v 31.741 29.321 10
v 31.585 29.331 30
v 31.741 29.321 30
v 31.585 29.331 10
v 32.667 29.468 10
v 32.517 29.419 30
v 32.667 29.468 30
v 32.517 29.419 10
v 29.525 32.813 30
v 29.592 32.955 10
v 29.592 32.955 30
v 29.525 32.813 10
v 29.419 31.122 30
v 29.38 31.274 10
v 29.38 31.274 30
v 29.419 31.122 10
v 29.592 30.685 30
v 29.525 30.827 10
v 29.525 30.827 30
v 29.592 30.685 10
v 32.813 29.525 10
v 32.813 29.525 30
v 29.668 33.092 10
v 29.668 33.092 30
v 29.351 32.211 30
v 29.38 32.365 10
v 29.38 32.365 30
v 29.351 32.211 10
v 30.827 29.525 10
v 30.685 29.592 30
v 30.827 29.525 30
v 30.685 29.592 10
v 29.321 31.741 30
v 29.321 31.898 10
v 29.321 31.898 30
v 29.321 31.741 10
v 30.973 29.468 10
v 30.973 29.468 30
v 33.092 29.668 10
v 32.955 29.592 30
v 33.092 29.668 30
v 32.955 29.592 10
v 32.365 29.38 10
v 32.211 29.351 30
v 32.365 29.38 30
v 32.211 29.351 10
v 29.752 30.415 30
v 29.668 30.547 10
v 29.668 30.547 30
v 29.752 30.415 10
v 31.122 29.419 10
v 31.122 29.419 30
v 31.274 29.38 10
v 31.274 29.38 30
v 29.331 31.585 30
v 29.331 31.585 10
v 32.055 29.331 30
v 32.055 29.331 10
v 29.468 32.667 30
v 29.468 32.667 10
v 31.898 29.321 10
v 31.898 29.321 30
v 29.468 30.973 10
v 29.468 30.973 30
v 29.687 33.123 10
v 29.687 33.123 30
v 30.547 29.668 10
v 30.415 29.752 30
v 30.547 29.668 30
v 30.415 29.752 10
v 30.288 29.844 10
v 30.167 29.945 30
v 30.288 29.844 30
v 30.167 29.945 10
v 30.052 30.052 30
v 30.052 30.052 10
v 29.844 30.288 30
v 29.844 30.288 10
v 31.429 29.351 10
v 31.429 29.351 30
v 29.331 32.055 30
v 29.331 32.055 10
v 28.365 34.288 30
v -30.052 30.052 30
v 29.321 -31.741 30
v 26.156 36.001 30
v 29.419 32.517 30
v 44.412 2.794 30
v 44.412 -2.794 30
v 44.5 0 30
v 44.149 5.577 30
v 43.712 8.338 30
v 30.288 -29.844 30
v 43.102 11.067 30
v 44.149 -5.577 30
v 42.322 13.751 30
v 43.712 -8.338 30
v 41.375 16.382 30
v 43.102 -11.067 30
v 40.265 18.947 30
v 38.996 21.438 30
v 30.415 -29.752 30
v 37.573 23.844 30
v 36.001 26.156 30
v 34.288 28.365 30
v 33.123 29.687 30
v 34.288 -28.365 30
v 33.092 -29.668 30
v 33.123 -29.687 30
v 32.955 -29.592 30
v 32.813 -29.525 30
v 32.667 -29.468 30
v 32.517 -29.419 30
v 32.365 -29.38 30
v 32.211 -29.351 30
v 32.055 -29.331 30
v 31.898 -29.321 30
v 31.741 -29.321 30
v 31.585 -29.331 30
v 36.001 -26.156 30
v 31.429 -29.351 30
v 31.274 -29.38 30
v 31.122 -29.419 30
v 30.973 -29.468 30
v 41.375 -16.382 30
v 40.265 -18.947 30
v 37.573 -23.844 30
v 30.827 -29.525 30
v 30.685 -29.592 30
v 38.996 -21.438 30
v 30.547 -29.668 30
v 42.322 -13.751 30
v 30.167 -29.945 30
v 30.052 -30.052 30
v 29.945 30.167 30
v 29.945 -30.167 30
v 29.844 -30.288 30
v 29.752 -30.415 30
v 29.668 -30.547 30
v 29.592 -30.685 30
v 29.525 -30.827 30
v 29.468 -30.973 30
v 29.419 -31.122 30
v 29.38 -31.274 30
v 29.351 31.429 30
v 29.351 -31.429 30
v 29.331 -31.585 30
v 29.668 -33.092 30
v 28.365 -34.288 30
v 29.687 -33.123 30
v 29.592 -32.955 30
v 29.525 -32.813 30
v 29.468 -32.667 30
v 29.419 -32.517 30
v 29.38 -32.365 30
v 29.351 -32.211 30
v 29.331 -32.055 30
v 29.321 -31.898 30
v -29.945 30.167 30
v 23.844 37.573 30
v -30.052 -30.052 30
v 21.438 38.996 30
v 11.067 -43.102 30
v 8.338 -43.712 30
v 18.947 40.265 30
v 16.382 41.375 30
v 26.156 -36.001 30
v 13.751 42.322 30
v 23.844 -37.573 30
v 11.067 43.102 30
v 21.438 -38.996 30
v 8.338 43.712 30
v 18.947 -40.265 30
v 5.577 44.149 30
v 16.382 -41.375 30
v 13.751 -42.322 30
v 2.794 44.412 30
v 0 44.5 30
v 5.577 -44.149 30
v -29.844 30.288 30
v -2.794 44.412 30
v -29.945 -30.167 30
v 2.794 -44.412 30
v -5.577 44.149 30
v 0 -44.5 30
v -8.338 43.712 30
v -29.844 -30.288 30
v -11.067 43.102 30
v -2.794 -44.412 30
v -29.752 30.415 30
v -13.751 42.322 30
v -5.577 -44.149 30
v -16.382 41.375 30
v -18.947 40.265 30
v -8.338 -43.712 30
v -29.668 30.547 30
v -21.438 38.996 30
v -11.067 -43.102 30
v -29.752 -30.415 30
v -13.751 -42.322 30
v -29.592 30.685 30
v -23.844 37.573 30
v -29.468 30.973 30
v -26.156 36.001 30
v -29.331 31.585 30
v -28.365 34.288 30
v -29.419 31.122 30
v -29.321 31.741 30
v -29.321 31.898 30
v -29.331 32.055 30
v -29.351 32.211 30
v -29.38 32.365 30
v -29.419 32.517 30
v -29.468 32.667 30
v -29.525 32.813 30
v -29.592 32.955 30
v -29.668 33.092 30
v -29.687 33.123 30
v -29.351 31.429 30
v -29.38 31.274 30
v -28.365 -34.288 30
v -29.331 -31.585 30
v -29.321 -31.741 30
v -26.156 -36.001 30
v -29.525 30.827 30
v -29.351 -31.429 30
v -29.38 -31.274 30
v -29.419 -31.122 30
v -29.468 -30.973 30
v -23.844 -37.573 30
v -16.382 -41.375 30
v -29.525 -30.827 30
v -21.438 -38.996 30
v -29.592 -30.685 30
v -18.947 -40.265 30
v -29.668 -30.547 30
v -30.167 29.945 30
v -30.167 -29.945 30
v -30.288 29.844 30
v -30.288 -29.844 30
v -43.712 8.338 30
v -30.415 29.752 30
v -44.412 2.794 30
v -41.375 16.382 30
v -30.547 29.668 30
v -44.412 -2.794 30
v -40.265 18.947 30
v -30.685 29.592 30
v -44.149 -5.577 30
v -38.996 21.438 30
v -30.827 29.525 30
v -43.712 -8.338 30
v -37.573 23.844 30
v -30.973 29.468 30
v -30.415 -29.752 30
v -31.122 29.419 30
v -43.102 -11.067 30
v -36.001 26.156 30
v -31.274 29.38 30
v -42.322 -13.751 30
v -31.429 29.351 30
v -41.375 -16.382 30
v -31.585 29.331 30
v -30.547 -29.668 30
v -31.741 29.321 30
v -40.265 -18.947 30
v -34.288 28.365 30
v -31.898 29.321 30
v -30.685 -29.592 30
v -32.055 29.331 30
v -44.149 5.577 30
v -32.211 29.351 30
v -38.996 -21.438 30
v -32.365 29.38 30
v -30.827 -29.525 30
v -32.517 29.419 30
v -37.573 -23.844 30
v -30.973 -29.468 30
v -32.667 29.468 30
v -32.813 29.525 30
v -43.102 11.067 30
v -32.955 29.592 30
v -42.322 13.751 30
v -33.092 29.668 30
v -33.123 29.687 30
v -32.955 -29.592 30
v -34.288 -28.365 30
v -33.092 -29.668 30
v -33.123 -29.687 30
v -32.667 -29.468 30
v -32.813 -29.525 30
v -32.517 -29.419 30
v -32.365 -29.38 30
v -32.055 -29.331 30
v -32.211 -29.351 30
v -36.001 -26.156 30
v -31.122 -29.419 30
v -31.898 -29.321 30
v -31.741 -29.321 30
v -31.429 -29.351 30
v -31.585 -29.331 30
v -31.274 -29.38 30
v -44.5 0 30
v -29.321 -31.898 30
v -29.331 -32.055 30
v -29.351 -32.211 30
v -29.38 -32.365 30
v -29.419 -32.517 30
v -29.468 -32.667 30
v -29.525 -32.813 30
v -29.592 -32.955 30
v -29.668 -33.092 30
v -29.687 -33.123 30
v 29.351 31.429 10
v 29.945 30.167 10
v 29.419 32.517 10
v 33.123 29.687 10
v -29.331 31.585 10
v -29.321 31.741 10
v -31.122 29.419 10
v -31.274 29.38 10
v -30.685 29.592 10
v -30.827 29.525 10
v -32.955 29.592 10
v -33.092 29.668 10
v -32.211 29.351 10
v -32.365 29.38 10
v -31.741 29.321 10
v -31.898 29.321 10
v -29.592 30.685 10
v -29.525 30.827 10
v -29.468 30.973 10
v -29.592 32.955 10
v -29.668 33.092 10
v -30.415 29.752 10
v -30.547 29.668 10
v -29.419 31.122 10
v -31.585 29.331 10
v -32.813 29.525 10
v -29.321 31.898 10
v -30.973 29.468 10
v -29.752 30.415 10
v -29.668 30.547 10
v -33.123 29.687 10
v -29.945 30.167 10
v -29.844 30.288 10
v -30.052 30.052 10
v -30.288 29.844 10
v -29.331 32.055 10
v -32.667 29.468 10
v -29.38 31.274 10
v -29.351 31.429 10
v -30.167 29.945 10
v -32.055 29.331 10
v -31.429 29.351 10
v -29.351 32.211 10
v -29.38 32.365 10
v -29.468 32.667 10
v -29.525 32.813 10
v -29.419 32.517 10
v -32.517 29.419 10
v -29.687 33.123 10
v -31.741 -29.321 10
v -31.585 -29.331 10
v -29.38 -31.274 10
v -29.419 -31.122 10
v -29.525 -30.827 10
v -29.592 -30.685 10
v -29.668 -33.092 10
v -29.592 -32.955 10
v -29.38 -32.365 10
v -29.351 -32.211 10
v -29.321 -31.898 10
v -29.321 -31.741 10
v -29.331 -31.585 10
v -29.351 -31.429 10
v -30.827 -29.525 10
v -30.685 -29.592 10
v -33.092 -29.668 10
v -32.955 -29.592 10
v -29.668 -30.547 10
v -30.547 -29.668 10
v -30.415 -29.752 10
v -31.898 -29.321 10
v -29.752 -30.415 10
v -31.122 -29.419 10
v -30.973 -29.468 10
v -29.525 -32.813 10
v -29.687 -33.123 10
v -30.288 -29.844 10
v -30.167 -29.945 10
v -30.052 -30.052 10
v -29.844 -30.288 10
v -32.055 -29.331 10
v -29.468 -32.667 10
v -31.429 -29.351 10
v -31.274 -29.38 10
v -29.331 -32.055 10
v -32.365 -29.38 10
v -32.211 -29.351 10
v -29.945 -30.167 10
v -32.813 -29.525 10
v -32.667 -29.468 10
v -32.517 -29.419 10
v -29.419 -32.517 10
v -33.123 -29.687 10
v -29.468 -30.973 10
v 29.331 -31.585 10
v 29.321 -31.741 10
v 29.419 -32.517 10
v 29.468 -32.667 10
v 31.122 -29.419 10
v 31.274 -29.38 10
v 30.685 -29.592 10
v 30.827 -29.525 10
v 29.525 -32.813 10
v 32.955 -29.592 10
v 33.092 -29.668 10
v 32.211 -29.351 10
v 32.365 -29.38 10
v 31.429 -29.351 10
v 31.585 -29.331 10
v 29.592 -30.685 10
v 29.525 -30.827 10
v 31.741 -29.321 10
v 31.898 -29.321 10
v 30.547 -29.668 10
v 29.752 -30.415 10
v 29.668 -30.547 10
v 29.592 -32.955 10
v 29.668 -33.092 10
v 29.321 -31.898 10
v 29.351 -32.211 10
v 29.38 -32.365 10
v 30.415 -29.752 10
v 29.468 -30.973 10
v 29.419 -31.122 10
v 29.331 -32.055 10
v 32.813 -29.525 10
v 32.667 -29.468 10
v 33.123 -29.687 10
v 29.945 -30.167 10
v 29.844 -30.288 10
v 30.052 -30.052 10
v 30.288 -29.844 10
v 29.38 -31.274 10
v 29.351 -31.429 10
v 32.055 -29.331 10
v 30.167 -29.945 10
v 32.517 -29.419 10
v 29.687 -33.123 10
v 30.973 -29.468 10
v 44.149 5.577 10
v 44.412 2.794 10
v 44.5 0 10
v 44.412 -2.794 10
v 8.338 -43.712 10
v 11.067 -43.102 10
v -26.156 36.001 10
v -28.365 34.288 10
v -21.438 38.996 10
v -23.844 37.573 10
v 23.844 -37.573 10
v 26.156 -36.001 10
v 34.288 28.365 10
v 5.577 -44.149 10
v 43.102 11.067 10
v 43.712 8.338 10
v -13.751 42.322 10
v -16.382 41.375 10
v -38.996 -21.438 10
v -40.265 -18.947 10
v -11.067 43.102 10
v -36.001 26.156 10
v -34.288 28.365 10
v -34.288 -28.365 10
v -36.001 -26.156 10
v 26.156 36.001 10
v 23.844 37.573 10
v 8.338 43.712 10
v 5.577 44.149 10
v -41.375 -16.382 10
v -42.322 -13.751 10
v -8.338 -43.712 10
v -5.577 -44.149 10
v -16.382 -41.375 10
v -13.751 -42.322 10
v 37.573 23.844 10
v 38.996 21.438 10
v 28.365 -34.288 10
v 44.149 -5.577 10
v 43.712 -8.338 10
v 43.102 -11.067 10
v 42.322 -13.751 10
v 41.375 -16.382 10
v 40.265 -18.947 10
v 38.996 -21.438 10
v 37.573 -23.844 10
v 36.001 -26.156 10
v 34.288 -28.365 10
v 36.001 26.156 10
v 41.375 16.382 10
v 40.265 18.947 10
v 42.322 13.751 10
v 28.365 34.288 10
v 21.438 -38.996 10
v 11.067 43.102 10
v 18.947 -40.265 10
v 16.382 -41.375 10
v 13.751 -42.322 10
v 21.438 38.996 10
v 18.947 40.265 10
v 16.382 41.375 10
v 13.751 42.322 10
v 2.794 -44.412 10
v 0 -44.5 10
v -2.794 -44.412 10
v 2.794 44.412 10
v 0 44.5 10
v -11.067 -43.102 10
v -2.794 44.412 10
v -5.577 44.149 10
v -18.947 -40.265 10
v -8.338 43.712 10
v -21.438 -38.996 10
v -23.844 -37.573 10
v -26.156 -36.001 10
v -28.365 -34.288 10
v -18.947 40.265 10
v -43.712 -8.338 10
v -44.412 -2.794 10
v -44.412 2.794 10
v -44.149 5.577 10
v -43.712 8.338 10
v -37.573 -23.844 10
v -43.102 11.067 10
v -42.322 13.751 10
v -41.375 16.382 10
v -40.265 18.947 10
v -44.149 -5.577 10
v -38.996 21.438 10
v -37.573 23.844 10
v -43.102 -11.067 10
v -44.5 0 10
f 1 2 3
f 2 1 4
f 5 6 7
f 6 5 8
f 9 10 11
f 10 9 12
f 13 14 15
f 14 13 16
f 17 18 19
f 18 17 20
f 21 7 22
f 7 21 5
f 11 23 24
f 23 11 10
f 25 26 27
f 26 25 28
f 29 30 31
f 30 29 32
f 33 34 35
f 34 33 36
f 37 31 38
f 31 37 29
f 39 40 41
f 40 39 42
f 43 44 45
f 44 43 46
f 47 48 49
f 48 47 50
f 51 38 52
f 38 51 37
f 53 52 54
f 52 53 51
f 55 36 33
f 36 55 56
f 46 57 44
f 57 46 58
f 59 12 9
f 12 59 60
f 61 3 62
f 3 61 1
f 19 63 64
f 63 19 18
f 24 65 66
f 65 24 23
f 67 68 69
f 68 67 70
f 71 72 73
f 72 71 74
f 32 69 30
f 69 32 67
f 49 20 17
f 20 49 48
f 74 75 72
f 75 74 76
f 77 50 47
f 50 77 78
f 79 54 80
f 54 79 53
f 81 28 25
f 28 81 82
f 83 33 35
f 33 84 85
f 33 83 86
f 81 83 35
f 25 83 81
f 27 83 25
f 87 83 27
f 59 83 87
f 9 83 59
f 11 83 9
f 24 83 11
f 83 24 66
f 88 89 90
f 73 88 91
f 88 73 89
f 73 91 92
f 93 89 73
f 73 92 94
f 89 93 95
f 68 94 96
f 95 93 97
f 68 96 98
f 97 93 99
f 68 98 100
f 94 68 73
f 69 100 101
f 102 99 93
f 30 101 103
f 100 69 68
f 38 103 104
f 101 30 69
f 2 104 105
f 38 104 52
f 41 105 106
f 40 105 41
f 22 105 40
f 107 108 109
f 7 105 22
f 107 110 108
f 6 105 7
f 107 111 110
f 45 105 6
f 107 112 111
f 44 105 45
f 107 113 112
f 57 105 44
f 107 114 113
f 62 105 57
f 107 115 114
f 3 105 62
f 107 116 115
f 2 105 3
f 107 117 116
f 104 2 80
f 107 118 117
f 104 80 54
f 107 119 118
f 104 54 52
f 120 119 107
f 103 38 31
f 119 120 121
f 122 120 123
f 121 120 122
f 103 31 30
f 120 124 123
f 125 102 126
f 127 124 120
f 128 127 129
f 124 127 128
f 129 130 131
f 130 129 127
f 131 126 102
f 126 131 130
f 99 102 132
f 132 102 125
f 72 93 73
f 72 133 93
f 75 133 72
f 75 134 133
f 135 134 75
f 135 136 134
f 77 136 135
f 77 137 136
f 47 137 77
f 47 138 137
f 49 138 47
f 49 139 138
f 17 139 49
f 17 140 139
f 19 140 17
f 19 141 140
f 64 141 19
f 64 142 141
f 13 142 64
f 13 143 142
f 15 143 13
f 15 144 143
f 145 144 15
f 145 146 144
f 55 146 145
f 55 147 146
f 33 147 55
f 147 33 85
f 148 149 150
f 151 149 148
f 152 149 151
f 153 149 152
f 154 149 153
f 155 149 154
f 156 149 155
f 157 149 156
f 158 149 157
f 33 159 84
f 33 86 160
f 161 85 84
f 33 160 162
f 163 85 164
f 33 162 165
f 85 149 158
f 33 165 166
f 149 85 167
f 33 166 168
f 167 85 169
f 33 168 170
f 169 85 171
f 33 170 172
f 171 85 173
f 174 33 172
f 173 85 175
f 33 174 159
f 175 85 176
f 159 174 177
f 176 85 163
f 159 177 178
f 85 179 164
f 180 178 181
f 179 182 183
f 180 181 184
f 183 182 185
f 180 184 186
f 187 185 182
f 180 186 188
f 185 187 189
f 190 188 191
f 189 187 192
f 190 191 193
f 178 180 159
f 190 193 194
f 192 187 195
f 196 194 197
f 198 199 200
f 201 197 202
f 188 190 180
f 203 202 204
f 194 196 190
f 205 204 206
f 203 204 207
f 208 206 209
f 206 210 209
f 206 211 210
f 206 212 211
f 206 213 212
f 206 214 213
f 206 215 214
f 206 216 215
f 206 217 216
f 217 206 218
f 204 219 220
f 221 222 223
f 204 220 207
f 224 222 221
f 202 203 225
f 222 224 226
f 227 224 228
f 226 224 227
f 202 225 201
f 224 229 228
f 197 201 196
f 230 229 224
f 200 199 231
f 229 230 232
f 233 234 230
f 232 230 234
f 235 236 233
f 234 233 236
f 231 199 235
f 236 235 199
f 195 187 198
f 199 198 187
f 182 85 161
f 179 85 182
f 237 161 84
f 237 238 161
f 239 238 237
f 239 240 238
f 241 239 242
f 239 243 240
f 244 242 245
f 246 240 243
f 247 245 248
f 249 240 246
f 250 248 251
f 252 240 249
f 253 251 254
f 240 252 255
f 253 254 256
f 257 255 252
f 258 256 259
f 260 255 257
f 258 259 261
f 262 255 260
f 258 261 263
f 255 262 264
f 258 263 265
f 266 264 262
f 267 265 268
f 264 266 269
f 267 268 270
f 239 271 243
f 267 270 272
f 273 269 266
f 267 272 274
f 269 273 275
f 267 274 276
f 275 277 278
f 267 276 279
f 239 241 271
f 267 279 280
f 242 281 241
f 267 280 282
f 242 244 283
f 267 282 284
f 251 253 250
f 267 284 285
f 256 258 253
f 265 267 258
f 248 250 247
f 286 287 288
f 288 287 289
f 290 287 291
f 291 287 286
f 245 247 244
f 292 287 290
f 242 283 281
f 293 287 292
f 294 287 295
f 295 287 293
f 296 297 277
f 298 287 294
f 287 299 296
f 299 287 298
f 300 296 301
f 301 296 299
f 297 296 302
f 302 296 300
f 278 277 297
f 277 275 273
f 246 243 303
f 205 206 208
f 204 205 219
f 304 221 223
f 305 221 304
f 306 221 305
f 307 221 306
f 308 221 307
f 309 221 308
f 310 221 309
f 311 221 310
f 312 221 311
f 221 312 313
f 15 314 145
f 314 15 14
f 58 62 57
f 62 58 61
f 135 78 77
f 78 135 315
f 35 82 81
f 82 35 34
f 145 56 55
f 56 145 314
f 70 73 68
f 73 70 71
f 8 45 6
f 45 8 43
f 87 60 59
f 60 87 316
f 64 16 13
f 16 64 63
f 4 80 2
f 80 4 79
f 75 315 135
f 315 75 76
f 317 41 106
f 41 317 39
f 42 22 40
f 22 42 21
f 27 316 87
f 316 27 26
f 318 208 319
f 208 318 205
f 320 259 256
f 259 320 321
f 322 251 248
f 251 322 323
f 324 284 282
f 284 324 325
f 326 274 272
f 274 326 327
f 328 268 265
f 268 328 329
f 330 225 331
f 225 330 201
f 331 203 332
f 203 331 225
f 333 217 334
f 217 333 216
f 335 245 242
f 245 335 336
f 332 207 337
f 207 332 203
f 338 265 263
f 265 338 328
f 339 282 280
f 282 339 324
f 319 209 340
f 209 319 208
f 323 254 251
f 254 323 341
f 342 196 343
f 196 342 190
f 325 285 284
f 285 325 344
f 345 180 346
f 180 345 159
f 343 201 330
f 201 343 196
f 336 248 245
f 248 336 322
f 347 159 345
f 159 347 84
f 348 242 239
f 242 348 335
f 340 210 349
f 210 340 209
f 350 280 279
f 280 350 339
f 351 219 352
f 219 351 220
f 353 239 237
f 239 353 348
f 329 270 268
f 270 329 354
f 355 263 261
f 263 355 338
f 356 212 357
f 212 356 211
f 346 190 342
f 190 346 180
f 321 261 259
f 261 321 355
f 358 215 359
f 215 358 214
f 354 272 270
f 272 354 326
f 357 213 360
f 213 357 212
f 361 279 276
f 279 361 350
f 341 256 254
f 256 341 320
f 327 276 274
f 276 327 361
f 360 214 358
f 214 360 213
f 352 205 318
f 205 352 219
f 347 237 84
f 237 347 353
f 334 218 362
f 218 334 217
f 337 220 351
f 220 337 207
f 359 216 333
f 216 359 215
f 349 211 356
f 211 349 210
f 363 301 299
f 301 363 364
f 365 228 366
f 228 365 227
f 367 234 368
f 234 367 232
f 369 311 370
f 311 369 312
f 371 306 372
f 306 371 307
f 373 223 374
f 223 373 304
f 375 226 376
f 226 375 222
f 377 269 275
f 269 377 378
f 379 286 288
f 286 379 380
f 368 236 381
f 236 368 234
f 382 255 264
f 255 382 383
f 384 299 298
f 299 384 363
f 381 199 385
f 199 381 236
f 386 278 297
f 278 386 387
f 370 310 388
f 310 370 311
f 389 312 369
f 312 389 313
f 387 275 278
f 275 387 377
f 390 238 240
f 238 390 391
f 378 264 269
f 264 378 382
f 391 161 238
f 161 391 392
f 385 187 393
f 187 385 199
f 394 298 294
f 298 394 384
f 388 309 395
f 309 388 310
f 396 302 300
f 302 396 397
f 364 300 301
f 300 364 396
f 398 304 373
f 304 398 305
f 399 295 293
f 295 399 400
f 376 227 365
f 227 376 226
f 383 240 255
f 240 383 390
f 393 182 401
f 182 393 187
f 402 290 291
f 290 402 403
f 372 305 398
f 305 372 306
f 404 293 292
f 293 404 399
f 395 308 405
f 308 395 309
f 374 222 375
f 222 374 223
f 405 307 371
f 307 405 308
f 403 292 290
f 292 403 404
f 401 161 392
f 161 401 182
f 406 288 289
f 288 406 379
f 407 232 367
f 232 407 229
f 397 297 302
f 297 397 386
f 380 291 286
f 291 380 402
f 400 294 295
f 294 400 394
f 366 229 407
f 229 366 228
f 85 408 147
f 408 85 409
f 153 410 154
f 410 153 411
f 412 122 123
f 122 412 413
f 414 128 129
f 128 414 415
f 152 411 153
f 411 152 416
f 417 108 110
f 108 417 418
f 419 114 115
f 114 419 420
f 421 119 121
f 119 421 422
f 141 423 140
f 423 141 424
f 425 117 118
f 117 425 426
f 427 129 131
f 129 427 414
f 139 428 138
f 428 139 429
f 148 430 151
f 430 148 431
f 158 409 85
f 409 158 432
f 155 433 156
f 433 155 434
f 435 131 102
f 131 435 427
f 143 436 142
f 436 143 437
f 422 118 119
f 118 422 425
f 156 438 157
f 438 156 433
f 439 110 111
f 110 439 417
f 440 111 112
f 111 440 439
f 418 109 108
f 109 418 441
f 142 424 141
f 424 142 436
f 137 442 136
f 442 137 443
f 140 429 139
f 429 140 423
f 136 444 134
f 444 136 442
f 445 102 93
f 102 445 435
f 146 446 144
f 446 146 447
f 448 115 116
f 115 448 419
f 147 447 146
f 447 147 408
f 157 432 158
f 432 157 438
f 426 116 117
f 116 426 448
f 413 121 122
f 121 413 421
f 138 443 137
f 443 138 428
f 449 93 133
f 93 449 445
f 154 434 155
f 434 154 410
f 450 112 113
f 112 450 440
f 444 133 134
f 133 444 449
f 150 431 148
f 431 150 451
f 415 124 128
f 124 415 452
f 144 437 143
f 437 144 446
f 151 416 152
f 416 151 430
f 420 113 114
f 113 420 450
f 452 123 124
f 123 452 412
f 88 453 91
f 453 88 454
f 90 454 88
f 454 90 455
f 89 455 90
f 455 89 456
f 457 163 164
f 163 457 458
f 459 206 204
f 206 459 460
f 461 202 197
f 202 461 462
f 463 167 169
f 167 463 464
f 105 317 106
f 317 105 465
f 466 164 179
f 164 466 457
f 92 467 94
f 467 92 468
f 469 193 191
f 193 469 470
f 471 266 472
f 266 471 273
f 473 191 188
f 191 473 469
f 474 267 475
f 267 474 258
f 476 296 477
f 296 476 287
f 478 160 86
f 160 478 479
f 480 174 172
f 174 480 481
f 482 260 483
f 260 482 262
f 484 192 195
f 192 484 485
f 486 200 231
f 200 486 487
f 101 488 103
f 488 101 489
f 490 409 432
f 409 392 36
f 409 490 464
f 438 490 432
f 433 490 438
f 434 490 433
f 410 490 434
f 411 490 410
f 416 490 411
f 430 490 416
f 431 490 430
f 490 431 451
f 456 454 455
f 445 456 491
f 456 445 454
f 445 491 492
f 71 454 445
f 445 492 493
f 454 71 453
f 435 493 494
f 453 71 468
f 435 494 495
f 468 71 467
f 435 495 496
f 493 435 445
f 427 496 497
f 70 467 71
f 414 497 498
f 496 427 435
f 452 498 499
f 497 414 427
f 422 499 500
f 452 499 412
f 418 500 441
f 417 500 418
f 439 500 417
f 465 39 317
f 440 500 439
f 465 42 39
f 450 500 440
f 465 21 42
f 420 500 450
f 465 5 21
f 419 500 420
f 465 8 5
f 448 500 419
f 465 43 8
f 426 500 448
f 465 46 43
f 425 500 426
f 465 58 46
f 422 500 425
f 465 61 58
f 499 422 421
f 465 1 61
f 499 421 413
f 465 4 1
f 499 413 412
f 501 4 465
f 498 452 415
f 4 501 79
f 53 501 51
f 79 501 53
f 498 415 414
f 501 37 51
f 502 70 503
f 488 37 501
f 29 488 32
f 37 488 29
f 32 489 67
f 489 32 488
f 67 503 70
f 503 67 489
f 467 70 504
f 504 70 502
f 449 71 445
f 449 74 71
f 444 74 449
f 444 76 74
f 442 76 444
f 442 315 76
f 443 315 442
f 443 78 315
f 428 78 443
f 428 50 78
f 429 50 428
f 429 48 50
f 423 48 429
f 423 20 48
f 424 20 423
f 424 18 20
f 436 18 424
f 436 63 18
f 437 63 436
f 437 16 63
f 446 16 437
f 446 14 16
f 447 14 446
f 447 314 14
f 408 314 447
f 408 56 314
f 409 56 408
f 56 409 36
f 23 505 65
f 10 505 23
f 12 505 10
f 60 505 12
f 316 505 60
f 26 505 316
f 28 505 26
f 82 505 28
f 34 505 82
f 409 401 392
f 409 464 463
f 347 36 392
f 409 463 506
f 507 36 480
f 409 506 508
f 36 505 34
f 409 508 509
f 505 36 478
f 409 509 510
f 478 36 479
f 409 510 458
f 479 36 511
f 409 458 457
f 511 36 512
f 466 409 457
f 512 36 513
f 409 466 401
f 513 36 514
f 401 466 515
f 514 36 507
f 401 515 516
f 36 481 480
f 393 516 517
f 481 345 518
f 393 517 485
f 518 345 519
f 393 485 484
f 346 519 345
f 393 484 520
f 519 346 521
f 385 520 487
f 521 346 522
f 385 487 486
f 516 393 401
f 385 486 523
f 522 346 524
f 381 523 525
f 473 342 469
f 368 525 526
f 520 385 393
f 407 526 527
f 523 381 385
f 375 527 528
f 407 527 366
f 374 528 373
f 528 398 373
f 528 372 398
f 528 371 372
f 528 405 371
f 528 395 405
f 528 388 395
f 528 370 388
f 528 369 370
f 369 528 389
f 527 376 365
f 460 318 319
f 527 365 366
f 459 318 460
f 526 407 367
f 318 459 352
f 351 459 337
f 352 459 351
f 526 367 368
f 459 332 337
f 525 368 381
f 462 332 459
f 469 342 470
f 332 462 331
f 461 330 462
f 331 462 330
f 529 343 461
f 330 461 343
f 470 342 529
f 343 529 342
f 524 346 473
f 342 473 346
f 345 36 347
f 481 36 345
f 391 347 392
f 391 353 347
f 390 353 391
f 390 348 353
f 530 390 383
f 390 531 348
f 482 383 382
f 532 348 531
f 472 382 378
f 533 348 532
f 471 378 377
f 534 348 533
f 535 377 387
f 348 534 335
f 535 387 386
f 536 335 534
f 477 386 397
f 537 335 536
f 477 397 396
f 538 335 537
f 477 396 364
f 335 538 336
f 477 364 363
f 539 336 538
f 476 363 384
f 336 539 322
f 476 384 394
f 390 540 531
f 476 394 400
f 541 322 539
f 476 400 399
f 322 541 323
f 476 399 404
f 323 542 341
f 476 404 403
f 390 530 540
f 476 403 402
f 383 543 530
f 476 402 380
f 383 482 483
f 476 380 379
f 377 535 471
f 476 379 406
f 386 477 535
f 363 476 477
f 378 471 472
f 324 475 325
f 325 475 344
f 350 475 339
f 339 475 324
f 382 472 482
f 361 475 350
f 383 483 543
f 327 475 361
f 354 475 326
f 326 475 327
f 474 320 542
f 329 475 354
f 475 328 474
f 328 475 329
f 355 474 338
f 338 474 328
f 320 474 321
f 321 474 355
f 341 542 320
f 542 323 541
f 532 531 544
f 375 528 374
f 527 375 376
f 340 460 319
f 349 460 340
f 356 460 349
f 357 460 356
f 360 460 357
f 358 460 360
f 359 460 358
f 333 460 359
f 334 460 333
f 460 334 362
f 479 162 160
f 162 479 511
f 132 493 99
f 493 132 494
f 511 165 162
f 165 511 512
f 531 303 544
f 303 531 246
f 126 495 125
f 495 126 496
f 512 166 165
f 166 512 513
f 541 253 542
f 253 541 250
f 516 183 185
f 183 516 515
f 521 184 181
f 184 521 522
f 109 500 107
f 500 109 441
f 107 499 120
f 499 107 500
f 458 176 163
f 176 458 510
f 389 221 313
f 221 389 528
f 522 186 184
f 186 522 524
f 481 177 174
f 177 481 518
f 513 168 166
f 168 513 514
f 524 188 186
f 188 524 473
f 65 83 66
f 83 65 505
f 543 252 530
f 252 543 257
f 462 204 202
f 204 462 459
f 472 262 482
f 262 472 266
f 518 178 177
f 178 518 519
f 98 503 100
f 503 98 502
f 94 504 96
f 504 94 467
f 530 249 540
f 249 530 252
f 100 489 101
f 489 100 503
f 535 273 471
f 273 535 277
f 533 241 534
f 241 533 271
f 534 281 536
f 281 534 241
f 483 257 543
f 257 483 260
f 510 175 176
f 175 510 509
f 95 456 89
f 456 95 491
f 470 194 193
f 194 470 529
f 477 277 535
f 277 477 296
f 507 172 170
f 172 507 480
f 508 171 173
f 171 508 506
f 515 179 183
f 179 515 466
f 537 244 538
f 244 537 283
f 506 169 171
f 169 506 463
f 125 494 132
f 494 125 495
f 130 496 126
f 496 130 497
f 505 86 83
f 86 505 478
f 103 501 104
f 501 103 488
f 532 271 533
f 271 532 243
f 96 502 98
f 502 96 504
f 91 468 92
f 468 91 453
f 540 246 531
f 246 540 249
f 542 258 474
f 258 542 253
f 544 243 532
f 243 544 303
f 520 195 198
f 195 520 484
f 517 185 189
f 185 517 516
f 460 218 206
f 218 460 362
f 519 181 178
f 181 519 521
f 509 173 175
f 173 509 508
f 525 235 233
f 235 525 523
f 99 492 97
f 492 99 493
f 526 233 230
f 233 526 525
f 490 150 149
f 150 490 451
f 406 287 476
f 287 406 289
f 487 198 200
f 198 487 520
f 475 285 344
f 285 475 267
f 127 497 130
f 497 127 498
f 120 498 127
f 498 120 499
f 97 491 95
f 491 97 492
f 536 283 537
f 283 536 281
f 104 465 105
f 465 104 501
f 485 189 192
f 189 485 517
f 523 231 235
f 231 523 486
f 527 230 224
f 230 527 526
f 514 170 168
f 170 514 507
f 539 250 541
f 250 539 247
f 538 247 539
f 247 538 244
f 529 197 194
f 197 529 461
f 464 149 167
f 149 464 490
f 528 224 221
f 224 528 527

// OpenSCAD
mysize = 50;
$fn =100;
/* modules */
module columns() {
  union() {
    for (j=[0:4]) {
      rotate([0, 0, 90*j+45]) {
        translate([0.9 * mysize, 0, -0.3*mysize]) {
          cylinder(r=0.05*mysize, h=1.2*mysize, center=true);
        }
      }
    }
  }
}
module bottom_handlers() {
  union() {
    for (j=[0:8]) {
      rotate([0, 0, 360/8*j]) {
        translate([1.1 * mysize, 0, -0.9*mysize]) {
          cylinder(r=0.2*mysize, h=0.2*mysize, center=true);
        }
      }
    }
  }
}
module top_handlers() {
  union() {
    for (j=[0:8]) {
      rotate([0, 0, 360/8*j]) {
        translate([1.1 * mysize, 0, 1.1*mysize]) {
          cylinder(r=0.2*mysize, h=0.2*mysize, center=true);
        }
      }
    }
  }
}
module thread(){
  color("red"){
    translate([0, 0, 0.3*mysize]) {
        linear_extrude(height=0.7*mysize, twist = -360, convexity = 10){
            intersection() {
              polygon(points=[[0,0],[2*mysize,0],[2*mysize*sin(60),2*mysize*cos(60)]], paths=[[0,1,2]]);
              difference() {
                circle(r=0.95*mysize, center = true);
                circle(r=0.85*mysize, center = true);
              }
            }
              intersection() {
              polygon(points=[[0,0],[-2*mysize,0],[-2*mysize*sin(60),-2*mysize*cos(60)]], paths=[[0,1,2]]);
              difference() {
                circle(r=0.95*mysize, center = true);
                circle(r=0.85*mysize, center = true);
              }
            }
        }
    }
  }
}
module base() {
  union(){
    color("lime"){
      translate([0, 0, -0.9*mysize]) {
        cylinder(r=mysize*1.09, h=0.2*mysize, center=true);
      }
    }
    difference() {
      cylinder(r=mysize*1.1, h=2*mysize, center=true);
      translate([0, 0, 0.2*mysize]) {
        cylinder(r=mysize*0.9, h=2*mysize, center=true); /*cylinder(r=mysize*<1>.9, h=2*mysize, center=true); - for invisible walls*/

      }
      translate([0, -mysize, 0]) {
        scale([1,2,1]){
          rotate([15, 0, 0]) {
            translate([0, 0, -1*mysize]) {
                cylinder(r=mysize*0.19, h=2*mysize, center=true);
            }
          }
        }
      }
      thread();
    }
    /* grinder holder */

    color([0/255, 0/255, 254/255]) {
      difference() {
        cylinder(r=mysize*0.99, h=0.2*mysize, center=true);
        cylinder(r1=mysize*0.90,r2=0.8*mysize, h=0.2*mysize, center=true);
      }
    }
    nozzle();
    columns();
    bottom_handlers();
  }
}

module pusher() {
  union(){
    color("lime"){
          translate([0, 0, 0.3*mysize]) {
          union(){
            translate([0, 0, 0.4*mysize]) {
              cylinder(r=mysize*0.9, h=0.8*mysize, center=true);
            }
            translate([0, 0, 0.8*mysize]) {
              cylinder(r=mysize*1.1, h=0.2*mysize, center=true);
            }
          }
       }
    }
    thread();
    spike_group();
    top_handlers();
  }

}

mysize = 50;
module hole (x,y){
      translate([x,y,0.2*mysize]){
        rotate([0,0,45]){
          scale([0.3,0.3,0.4]){
          translate([0, 0, 0.07*mysize]){
            cylinder(r1=0.1*mysize,r2=0.25*mysize,h=0.2*mysize,$fn=4);
          }
          rotate([0,0,45]){
            translate([0, 0, -0.1*mysize]) {
              cube ([0.14*mysize, 0.14*mysize, 0.35*mysize], center=true);
            }
          }
        }
      }
    }
  }
module hole_group(){
  union(){
    for (j=[-10:10]) {
      for (i=[-10:10]) {
        hole(i*0.1*mysize,j*0.1*mysize);
      }
    }
  }
}
module spike (x,y){
      translate([x,y,0.25*mysize]){
        rotate([0,0,45]){
          scale([0.3,0.3,0.2]){
          translate([0, 0, 0.07*mysize]){
            cylinder(r1=0,r2=0.25*mysize,h=0.2*mysize,$fn=4);
          }
        }
      }
    }
  }
module spike_group(){
  union(){
    translate([0,0,0.28*mysize])
    difference(){
      cylinder(r=mysize*0.9, h=0.07*mysize, center=true);
      cylinder(r=mysize*0.85, h=0.07*mysize, center=true);
    }  
    intersection(){
      cylinder(r=mysize*0.9, h=2*mysize, center=true);
        union(){
          for (j=[-10:10]) {
            for (i=[-10:10]) {
              spike(i*0.1*mysize,j*0.1*mysize);
            }
          }
      }
    }
  }  
}
module grid(){
    union(){
      translate([0,0, 0.2*mysize]){
        difference() {
          cylinder(r=0.89*mysize, h=0.2*mysize, center=true);
          cylinder(r=0.85*mysize, h=0.2*mysize, center=true);
          columns();
        }
      }

      difference() {
        translate([0,0, 0.2*mysize]){
          cylinder(r=0.89*mysize, h=0.2*mysize, center=true);
        }
        /*hole_group(); */ /*for preview*/
        columns();
      }
    }
}

module nozzle(){
  difference() {
      translate([0, -mysize, 0]) {
        scale([1,2,1]){
          rotate([15, 0, 0]) {
            difference() {
              cylinder(r=mysize*0.3, h=1.6*mysize, center=true);
              translate([0, 0, -3*mysize]) {
                cube([mysize,mysize,mysize]);
              }
              translate([0, 0, 3*mysize]) {
                cube([mysize,mysize,mysize]);
              }
              cylinder(r=mysize*0.2, h=2*mysize, center=true);
            }
          }
        }
      }
      translate([0, 0, 0.2*mysize]) {
        cylinder(r=mysize*0.9, h=2*mysize, center=true);
      }
      thread();
  }
}

/* drawing */
scale([1,1,2]) {
grid();
}
